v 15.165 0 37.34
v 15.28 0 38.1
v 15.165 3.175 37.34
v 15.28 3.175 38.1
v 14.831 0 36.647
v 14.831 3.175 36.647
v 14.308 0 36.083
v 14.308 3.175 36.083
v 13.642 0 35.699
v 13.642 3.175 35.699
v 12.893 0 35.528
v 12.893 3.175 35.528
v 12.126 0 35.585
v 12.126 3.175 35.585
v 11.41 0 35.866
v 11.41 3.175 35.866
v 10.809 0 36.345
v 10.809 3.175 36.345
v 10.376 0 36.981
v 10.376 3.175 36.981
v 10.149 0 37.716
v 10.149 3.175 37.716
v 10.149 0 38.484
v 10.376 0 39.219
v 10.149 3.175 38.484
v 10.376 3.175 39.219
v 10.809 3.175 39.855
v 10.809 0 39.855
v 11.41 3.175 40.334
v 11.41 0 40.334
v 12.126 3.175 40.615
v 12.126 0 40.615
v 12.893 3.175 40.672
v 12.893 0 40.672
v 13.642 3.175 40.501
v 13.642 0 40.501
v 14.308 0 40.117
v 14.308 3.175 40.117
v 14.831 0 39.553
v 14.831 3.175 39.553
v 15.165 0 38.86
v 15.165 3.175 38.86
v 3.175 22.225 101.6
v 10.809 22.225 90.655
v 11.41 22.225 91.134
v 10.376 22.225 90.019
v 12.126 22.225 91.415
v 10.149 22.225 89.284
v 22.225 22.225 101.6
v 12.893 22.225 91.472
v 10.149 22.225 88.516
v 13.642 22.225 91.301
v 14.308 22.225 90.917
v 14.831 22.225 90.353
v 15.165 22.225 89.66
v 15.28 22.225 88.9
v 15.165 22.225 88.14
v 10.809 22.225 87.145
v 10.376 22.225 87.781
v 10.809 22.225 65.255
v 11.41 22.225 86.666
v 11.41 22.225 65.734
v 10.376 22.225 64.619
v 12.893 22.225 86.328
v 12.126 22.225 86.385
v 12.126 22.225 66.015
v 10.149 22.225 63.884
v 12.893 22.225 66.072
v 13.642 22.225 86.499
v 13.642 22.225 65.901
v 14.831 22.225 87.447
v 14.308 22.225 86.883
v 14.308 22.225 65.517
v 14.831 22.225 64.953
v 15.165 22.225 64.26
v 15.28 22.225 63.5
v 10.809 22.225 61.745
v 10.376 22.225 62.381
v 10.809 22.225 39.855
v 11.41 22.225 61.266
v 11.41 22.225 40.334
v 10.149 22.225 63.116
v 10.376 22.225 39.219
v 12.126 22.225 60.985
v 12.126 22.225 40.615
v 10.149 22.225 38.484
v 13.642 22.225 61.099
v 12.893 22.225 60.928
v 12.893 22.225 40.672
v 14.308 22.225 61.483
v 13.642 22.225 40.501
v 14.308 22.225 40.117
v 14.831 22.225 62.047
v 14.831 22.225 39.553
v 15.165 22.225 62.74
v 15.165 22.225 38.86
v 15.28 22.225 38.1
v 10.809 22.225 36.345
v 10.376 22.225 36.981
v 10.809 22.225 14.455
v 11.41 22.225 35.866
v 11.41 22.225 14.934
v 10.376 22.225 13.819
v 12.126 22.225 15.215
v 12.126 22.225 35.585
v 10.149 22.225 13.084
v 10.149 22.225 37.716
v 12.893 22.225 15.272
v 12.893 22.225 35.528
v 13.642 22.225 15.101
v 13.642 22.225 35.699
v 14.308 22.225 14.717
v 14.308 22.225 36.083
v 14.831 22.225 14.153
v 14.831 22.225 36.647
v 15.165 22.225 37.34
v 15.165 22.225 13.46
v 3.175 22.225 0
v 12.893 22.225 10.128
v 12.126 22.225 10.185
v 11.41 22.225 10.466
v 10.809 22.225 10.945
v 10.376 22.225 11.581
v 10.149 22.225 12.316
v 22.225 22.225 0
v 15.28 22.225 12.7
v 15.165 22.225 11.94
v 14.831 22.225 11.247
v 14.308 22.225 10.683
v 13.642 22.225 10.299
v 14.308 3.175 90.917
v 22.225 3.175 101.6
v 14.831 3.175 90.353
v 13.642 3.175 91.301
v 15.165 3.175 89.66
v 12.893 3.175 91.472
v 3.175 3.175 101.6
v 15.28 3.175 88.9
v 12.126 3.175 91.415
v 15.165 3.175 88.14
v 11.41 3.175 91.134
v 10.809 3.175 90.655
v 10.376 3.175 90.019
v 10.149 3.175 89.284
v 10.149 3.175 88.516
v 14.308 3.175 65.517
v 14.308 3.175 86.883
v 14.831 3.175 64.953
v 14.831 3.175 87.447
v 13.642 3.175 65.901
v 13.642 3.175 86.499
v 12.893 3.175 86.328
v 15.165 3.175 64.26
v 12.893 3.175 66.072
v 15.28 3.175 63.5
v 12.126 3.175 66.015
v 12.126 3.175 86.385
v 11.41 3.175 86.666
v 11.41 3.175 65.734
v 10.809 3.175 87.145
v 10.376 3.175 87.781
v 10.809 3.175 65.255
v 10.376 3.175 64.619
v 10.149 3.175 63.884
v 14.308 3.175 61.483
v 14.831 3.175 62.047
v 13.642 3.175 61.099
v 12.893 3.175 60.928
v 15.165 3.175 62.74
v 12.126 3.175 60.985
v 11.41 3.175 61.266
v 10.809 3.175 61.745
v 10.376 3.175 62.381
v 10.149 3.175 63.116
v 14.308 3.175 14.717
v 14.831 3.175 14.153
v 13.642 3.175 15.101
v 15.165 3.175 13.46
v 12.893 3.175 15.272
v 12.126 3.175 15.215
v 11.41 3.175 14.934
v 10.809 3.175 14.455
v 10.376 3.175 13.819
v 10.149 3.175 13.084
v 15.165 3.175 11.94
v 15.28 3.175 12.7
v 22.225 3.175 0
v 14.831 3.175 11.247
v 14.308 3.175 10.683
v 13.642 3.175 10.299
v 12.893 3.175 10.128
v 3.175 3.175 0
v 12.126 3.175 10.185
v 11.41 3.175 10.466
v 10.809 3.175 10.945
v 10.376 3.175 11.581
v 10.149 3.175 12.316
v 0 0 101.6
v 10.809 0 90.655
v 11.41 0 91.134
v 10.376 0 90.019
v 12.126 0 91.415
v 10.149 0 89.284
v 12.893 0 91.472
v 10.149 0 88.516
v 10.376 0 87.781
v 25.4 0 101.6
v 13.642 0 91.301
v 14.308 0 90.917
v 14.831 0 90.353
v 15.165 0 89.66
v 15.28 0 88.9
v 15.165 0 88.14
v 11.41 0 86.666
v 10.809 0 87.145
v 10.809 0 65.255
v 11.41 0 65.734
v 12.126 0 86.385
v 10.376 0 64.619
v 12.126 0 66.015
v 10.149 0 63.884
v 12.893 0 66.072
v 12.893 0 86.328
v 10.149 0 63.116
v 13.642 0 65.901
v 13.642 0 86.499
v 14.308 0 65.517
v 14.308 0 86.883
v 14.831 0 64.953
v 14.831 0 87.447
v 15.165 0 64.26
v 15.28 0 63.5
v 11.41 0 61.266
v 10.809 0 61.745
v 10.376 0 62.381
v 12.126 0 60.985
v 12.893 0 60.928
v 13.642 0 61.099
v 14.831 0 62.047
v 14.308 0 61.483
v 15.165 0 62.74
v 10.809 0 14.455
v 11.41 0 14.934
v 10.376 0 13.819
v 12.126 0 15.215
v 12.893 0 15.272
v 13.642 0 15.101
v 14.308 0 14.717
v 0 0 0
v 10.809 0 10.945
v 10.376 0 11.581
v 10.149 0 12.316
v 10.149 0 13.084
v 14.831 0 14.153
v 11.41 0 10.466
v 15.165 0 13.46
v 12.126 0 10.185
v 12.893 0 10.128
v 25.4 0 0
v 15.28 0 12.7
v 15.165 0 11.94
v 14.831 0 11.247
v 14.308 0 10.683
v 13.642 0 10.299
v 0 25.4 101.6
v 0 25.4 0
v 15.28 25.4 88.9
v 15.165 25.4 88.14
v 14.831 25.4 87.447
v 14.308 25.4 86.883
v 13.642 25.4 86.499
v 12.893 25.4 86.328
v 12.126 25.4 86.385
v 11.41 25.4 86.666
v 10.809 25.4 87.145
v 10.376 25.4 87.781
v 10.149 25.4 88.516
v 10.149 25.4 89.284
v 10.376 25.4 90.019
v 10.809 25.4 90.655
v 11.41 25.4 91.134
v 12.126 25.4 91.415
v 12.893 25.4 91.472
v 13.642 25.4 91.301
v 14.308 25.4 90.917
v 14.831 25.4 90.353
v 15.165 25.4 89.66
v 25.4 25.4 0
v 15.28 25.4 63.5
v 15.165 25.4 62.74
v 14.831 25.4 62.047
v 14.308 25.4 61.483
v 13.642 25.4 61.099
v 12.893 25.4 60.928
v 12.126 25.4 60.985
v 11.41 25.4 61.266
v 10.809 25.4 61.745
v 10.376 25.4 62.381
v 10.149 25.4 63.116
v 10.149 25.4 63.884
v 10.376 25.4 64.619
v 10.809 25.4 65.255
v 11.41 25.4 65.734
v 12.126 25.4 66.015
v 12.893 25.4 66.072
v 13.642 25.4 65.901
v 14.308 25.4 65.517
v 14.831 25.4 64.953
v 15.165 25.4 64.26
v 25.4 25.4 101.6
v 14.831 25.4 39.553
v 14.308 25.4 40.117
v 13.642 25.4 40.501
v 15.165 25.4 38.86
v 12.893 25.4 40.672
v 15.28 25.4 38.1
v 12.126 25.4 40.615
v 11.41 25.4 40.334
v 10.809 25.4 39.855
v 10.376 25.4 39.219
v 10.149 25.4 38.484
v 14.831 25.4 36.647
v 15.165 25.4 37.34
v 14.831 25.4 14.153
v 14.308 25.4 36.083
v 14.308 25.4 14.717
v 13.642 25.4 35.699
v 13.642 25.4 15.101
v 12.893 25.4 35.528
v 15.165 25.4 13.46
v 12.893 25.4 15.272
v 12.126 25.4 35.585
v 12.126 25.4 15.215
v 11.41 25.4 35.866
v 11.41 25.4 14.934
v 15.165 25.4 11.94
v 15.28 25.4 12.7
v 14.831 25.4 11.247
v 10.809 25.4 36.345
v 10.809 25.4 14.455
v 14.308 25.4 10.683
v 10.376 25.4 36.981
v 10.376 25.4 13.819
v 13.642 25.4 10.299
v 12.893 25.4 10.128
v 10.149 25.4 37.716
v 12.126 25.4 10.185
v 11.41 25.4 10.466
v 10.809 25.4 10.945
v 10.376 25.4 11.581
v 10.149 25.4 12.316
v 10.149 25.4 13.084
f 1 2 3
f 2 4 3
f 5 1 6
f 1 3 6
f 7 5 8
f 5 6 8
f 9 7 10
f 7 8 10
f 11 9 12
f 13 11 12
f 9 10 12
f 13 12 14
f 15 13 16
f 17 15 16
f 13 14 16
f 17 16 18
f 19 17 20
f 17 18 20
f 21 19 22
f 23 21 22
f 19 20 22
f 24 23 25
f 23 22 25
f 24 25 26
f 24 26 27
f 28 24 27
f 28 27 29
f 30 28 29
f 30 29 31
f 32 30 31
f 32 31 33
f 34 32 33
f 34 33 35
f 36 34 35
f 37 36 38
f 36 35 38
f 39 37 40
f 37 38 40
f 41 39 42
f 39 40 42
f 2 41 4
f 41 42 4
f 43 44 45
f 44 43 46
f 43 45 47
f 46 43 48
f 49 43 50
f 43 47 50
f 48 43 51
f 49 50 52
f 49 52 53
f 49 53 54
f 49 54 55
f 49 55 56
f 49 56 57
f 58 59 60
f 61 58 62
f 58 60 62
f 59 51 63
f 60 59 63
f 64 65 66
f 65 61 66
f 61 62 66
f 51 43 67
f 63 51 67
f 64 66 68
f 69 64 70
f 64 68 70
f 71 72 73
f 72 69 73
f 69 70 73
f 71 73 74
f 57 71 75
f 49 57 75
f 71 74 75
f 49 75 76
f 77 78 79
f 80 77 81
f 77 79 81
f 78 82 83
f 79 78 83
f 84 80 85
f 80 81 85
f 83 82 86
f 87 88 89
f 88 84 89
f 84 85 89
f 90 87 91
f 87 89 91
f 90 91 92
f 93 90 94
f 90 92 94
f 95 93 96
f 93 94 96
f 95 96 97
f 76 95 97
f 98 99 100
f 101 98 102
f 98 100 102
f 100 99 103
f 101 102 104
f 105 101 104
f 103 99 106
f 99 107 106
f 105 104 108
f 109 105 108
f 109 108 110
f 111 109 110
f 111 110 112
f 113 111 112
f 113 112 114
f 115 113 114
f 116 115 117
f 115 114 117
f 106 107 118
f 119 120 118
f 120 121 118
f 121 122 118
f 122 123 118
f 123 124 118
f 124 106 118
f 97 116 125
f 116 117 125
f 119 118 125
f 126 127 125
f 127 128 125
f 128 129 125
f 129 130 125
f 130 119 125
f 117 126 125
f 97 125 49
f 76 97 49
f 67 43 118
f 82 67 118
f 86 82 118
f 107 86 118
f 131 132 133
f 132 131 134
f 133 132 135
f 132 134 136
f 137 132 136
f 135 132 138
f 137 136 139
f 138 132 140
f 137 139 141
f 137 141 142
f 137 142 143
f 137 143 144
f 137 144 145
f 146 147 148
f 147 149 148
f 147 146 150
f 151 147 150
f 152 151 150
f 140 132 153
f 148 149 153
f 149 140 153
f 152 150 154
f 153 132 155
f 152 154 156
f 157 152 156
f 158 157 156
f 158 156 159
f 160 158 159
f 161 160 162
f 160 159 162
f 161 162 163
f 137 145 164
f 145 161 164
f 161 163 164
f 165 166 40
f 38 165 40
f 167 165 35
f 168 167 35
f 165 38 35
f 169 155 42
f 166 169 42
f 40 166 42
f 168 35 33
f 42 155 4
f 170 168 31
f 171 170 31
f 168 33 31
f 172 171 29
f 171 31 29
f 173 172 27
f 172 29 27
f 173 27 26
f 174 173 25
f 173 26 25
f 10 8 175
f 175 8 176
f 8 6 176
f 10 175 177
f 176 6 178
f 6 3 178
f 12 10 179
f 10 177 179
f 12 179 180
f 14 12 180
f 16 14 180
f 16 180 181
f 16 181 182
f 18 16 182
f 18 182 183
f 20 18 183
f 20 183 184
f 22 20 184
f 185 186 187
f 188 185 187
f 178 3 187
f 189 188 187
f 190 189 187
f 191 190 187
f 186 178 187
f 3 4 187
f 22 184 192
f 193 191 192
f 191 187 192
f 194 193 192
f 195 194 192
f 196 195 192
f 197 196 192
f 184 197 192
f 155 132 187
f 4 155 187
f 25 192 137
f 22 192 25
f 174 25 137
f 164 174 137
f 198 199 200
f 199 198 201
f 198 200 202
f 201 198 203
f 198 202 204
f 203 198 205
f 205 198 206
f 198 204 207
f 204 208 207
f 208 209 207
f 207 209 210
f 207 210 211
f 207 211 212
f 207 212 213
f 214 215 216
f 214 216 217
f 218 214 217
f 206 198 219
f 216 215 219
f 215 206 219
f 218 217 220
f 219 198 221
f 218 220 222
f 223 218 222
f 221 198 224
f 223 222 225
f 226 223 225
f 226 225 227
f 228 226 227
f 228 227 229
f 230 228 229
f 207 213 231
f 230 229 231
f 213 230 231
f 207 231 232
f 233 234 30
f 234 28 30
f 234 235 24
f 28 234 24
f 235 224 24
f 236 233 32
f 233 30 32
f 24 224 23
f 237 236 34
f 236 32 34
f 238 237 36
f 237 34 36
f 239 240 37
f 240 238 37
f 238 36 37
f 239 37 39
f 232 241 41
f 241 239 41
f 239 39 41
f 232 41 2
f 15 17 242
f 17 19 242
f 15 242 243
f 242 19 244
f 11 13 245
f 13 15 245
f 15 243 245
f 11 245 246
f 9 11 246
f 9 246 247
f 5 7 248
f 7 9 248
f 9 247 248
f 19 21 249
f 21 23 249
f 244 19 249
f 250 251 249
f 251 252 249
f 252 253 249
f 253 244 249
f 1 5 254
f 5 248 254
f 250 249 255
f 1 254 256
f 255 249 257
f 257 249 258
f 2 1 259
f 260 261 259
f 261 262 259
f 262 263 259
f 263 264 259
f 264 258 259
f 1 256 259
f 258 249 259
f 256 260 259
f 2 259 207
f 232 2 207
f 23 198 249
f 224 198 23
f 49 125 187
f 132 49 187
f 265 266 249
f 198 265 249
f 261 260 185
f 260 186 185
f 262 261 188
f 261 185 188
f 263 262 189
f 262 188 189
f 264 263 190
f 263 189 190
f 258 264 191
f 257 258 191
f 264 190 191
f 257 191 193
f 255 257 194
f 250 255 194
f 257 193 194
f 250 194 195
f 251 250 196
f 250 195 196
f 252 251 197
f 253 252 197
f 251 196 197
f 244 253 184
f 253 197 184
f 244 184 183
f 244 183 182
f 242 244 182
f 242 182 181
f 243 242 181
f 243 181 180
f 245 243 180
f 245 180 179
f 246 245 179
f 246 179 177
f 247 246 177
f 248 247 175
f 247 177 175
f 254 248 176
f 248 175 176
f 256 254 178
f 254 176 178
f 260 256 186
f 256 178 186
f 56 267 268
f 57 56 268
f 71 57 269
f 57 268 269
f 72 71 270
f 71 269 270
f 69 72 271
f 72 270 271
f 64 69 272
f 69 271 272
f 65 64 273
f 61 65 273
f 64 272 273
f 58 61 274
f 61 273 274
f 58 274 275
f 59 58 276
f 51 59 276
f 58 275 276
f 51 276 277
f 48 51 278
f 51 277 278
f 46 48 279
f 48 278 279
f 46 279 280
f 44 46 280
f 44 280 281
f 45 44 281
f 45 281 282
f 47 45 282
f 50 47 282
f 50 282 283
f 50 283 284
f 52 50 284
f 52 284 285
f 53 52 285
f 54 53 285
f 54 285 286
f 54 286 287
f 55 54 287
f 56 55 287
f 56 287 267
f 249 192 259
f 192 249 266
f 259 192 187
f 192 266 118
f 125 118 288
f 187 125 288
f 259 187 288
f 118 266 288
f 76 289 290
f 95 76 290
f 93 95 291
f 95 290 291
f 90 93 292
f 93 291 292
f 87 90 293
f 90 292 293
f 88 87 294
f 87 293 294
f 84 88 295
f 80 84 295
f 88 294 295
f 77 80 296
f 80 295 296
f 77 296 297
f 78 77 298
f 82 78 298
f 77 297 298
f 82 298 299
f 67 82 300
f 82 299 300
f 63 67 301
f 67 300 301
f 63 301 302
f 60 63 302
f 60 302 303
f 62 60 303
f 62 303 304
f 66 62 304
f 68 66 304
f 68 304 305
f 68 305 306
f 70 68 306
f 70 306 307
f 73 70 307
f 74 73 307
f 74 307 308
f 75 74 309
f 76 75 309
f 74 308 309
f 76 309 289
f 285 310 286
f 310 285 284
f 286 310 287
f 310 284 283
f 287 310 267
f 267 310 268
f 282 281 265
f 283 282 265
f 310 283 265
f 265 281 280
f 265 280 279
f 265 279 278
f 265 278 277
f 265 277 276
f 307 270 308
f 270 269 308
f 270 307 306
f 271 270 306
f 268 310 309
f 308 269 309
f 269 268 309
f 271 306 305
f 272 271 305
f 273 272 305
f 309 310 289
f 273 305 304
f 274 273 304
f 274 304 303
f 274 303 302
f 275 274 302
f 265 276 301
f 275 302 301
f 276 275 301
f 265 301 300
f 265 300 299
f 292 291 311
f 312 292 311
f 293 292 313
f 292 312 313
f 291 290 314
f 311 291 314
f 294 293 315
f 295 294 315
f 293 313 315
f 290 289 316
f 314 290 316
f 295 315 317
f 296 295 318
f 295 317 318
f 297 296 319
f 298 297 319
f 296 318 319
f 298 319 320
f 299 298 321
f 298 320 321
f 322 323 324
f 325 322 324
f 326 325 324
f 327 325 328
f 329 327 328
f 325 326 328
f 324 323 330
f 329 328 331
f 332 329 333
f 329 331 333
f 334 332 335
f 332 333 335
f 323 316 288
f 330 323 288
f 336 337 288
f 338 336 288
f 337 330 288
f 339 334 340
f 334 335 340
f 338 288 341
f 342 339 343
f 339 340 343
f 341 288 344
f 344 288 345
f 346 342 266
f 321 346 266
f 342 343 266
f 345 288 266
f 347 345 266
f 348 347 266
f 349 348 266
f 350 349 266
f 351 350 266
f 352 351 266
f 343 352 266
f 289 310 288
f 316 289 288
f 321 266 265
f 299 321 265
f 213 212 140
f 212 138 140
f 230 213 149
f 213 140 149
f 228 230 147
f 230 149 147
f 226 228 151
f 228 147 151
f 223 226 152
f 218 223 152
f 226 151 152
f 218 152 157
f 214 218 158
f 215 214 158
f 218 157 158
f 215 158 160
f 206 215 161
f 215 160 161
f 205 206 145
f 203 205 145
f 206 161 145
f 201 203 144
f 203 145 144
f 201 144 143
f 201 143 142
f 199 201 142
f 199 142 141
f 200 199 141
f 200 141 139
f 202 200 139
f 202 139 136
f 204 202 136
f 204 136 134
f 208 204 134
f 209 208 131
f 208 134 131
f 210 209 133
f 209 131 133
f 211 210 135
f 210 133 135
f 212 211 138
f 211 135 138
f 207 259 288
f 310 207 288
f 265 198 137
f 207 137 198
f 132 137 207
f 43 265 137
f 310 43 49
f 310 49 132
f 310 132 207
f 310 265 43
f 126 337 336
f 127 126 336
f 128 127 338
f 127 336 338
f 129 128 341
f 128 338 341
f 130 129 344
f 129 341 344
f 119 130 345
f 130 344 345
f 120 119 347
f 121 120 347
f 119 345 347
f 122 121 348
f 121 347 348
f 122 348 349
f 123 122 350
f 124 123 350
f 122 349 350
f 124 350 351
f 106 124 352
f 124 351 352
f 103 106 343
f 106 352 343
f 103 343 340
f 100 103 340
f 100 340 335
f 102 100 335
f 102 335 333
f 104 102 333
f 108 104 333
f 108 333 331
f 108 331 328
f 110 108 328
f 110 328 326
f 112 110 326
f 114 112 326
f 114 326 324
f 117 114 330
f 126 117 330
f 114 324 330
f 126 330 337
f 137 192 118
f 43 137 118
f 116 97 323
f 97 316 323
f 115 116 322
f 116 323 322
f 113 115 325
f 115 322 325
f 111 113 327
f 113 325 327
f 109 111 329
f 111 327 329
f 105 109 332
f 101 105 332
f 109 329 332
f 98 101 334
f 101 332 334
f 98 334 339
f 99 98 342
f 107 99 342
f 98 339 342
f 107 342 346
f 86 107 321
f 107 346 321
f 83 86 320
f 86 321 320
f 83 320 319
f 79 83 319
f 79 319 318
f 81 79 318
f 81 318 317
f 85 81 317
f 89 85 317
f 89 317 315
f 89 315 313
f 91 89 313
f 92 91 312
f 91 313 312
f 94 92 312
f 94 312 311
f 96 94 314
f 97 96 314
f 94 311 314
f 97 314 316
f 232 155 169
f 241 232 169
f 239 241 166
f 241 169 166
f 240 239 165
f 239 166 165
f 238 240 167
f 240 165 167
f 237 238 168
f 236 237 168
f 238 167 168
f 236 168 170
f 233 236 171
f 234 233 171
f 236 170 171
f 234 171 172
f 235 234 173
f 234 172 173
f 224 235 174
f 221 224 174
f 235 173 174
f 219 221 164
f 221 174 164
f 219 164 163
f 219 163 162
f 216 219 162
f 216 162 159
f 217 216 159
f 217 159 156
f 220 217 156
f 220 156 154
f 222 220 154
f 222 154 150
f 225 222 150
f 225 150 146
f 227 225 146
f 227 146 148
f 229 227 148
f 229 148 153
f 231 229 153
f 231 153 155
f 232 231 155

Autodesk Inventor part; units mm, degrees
ref_plane "YZ Plane" through (0, 0, 0) normal (1, 0, 0) x (0, 1, 0)
ref_plane "XZ Plane" through (0, 0, 0) normal (0, 1, 0) x (-1, 0, 0)
ref_plane "XY Plane" through (0, 0, 0) normal (0, 0, 1) x (1, 0, 0)
sketch "Sketch1" plane through (0, 0, 0) normal (0, 0, 1) x (1, 0, 0)
  line L0 (0, 0) -> (25.4, 0)
  line L1 (25.4, 0) -> (25.4, 25.4)
  line L2 (25.4, 25.4) -> (0, 25.4)
  line L3 (0, 25.4) -> (0, 0)
  line L4 (3.175, 22.225) -> (22.225, 22.225)
  line L5 (22.225, 22.225) -> (22.225, 3.175)
  line L6 (22.225, 3.175) -> (3.175, 3.175)
  line L7 (3.175, 3.175) -> (3.175, 22.225)
  dimension "d0" = 25.4
  dimension "d1" = 25.4
  dimension "d2" = 3.175
extrude "Extrusion1" add sketch "Sketch1" along normal blind 101.6
sketch "Sketch2" plane through (0, 25.4, 0) normal (0, 1, 0) x (1, 0, 0)
  line L0 (0, 0) -> (25.4, 0) construction
  line L1 (12.7, 0) -> (12.7, -12.7) construction
  line L2 (12.7, -12.7) -> (12.7, -38.1) construction
  line L3 (12.7, -38.1) -> (12.7, -63.5) construction
  line L4 (12.7, -63.5) -> (12.7, -88.9) construction
  circle A0 centre (12.7, -88.9) radius 2.5797
  circle A1 centre (12.7, -63.5) radius 2.5797
  circle A2 centre (12.7, -38.1) radius 2.5797
  circle A3 centre (12.7, -12.7) radius 2.5797
  dimension "d5" = 12.7
  dimension "d6" = 25.4
  dimension "d7" = 25.4
  dimension "d8" = 25.4
  dimension "d9" = 5.1594
extrude "Extrusion2" cut sketch "Sketch2" against normal blind 101.6
properties part number "4in 1x1"
